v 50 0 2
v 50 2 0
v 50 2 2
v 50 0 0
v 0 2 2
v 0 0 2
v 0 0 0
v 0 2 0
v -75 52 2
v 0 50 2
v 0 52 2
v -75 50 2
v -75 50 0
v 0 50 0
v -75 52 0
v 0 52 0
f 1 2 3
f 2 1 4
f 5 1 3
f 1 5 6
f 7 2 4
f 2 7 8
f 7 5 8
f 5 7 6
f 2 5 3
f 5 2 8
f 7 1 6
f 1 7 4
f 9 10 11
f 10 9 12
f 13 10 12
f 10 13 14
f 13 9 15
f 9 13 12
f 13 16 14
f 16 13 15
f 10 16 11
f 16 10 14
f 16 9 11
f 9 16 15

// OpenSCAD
length1 = 50;
length2 = 75;
thickness = 2;
bend_angle = 90;

module l_bracket() {
    cube([length1, thickness, thickness]);
    rotate([0, 0, bend_angle])
        translate([length1, 0, 0])
        cube([thickness, length2, thickness]);
}

l_bracket();
